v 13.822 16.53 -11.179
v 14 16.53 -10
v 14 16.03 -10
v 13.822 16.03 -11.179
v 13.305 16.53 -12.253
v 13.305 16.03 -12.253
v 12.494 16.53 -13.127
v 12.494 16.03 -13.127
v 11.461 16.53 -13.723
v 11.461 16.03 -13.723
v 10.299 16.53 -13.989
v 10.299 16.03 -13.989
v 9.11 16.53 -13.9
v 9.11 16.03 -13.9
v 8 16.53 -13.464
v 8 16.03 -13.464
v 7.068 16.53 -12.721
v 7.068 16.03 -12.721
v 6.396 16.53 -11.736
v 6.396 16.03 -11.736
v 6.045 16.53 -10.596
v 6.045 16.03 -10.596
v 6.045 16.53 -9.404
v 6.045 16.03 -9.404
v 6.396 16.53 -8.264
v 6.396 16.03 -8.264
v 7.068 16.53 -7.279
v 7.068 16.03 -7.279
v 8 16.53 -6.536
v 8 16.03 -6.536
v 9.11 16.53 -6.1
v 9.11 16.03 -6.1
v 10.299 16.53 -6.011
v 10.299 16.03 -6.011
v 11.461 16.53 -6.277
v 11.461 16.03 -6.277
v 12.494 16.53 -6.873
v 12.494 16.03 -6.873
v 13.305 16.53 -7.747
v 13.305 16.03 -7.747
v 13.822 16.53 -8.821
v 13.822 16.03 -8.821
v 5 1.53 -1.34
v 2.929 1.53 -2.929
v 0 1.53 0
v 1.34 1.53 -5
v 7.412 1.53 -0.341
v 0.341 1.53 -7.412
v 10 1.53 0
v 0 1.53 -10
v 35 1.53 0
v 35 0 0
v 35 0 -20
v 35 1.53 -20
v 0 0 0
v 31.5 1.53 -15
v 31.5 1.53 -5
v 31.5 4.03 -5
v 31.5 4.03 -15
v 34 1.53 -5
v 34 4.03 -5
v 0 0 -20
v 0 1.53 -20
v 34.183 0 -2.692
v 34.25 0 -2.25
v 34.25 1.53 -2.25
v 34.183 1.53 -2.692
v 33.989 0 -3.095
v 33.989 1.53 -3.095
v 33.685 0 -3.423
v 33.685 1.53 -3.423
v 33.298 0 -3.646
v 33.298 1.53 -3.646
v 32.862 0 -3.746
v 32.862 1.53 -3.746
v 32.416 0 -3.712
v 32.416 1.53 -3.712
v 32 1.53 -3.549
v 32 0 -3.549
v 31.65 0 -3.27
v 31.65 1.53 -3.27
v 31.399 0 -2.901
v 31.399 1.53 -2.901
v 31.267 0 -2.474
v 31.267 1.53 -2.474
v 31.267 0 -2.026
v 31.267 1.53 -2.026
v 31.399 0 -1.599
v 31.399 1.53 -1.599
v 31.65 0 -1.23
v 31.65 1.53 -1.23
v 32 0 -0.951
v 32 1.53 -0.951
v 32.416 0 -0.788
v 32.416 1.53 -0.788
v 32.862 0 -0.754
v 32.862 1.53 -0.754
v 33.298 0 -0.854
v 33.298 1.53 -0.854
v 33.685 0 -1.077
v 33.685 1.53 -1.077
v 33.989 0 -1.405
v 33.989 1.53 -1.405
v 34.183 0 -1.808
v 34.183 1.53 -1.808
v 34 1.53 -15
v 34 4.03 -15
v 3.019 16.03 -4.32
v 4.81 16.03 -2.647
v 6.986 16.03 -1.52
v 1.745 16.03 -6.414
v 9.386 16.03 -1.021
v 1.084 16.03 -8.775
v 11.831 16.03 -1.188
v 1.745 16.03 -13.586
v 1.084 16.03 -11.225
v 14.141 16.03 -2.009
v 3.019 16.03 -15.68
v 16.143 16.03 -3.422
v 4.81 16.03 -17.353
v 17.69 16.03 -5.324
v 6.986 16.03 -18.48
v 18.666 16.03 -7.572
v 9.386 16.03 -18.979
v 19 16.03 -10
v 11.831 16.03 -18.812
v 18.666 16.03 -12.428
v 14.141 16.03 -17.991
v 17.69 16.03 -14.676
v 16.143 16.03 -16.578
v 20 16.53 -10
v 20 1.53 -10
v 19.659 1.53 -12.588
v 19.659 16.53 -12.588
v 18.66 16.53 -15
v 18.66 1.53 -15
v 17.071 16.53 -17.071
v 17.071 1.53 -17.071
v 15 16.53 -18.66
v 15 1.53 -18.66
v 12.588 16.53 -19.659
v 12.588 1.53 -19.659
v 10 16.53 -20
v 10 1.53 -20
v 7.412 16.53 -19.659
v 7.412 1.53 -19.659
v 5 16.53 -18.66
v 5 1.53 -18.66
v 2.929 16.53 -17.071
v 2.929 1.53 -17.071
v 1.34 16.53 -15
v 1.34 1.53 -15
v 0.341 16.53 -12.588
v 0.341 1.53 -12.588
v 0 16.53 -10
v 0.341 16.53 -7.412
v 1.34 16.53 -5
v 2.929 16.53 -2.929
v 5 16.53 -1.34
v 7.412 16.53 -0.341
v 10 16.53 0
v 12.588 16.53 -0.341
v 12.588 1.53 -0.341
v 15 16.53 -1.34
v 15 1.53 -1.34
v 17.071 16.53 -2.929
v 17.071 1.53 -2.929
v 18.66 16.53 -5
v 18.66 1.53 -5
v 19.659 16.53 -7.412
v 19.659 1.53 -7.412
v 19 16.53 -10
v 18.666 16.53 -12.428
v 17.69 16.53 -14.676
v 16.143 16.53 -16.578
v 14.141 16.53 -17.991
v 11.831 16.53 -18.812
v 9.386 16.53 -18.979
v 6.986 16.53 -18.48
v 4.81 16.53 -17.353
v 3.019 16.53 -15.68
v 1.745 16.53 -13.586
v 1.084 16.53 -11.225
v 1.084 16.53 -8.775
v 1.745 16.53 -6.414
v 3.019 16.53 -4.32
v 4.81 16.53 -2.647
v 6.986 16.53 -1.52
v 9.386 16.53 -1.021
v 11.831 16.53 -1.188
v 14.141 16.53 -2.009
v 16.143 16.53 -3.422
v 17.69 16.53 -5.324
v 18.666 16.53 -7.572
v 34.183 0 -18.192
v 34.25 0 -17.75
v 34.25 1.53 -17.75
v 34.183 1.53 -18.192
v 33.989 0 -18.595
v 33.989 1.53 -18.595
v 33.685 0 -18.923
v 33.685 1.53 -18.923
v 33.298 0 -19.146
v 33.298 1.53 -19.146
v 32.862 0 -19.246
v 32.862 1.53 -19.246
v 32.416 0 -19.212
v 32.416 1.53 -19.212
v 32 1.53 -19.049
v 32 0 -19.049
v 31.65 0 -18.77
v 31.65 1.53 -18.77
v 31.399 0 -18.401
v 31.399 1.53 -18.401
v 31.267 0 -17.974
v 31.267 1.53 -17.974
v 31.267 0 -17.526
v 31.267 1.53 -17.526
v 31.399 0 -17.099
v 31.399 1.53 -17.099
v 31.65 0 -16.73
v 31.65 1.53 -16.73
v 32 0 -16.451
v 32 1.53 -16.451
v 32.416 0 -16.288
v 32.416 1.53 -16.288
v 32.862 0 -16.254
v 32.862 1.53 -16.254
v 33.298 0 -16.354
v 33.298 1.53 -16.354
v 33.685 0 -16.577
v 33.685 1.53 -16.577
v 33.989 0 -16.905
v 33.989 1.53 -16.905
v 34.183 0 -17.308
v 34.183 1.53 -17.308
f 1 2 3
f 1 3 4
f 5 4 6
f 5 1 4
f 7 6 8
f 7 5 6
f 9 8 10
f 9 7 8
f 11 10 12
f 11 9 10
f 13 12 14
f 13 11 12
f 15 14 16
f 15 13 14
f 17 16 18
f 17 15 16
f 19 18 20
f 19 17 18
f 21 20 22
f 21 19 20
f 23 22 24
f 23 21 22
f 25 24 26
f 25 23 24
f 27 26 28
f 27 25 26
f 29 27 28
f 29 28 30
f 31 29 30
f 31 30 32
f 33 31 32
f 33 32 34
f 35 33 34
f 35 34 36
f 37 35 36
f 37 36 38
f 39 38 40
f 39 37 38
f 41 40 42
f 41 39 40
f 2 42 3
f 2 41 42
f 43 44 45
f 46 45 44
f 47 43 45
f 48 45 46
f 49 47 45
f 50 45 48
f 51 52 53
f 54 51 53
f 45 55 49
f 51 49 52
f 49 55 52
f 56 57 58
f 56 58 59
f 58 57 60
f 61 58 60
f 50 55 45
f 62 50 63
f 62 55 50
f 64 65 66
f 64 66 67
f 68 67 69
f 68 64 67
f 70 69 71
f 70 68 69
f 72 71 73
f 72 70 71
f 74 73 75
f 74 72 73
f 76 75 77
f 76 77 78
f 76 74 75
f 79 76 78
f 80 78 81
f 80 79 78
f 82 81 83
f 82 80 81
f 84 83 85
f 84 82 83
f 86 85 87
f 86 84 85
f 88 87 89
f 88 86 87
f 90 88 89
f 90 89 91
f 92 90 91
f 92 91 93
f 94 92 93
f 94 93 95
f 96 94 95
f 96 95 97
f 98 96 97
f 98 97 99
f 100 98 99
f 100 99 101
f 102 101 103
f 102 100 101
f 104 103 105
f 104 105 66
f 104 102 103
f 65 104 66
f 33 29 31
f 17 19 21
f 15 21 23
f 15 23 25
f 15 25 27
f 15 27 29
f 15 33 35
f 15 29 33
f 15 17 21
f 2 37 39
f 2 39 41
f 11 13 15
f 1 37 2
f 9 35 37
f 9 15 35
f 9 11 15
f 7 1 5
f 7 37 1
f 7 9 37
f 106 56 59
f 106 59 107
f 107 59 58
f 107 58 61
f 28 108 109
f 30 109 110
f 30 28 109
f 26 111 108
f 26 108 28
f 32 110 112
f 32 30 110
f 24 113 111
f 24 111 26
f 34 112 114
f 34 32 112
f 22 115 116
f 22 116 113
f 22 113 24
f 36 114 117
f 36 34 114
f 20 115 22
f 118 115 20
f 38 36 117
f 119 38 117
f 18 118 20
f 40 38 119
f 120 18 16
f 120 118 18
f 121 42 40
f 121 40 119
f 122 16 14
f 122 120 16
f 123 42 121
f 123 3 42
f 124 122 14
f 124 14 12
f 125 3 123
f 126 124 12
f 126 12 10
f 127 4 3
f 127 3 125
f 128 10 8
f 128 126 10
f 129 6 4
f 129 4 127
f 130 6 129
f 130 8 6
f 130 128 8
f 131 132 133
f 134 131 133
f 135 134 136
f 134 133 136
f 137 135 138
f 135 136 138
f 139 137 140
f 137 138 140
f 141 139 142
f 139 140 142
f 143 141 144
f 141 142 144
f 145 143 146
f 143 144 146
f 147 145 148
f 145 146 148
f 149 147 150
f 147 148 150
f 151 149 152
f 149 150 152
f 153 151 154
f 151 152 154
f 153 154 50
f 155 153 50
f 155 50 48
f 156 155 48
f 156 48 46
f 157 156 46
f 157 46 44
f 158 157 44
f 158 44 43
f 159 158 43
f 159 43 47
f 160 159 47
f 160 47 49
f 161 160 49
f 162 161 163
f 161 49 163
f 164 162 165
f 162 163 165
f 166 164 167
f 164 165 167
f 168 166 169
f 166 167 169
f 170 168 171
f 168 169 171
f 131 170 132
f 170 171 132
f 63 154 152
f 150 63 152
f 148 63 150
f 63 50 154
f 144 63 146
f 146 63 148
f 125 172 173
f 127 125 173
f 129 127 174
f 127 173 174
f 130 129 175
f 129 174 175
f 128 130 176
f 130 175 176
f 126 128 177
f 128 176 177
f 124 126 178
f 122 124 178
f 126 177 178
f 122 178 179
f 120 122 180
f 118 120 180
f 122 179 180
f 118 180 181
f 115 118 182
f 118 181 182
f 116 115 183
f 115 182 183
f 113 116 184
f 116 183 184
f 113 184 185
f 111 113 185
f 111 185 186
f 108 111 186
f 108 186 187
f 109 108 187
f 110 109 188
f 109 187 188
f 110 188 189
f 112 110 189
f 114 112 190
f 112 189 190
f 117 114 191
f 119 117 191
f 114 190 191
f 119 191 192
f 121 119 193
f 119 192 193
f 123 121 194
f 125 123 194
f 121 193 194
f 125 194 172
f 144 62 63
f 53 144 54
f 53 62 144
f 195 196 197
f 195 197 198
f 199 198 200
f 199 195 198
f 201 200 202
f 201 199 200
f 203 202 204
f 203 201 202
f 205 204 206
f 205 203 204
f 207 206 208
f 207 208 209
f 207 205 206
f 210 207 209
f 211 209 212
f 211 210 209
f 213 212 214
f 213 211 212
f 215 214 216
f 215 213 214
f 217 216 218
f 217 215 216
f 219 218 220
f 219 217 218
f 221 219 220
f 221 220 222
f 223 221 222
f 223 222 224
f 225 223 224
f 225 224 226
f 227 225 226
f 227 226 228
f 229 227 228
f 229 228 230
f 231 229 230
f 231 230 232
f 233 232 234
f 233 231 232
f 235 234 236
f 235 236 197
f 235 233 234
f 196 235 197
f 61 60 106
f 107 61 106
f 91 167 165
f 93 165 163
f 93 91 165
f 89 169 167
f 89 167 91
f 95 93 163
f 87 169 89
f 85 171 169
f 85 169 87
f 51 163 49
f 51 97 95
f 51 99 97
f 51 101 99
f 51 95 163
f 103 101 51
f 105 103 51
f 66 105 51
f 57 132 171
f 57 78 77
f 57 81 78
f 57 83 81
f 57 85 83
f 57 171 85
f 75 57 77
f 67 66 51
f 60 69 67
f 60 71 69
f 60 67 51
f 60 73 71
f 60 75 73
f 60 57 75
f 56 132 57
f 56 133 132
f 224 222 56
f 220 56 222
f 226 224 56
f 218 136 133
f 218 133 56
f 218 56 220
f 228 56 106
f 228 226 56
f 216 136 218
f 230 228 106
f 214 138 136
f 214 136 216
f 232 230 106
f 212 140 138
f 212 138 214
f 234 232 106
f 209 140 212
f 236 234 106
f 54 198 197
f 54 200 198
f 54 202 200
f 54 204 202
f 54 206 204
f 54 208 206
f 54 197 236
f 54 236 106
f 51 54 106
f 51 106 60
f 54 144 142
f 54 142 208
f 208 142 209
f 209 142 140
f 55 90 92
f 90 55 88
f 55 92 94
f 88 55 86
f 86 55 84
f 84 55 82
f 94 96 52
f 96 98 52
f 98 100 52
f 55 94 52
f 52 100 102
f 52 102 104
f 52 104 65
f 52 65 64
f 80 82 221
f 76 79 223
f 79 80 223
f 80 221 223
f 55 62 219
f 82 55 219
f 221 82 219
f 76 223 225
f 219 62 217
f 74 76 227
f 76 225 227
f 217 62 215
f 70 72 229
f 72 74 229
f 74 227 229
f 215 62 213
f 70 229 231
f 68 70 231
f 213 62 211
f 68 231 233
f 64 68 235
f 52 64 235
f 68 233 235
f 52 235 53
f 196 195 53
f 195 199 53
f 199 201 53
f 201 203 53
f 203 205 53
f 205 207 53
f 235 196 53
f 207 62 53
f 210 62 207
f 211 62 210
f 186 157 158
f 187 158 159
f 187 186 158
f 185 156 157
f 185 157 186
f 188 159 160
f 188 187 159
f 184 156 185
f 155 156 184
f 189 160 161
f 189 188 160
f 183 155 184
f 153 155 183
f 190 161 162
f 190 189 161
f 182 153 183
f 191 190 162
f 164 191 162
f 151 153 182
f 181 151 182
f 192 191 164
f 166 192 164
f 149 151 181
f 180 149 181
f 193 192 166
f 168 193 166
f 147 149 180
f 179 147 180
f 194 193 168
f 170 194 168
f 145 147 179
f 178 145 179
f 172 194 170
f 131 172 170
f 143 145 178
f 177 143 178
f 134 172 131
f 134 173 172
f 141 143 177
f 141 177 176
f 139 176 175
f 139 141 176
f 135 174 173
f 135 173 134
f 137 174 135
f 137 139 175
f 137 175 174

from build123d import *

# Parameters (mm, degrees)
SKETCH1_W           = 35
SKETCH1_H           = 20
SKETCH1_R           = 1.5
BOSS_EXTRUDE1_DEPTH = 1.53
SKETCH2_R           = 10
BOSS_EXTRUDE2_DEPTH = 15
SKETCH3_R           = 9
SKETCH3_R_2         = 4
CUT_EXTRUDE1_DEPTH  = 0.5
SKETCH4_W           = 2.5
SKETCH4_H           = 10
BOSS_EXTRUDE3_DEPTH = 2.5


with BuildPart() as part:
    # Sketch1 → Boss-Extrude1 (new body)
    with BuildSketch(Plane(origin=(0, 0, 0), x_dir=(1, 0, 0), z_dir=(0, 1, 0))):
        with Locations((17.5, 10)):
            Rectangle(SKETCH1_W, SKETCH1_H)
        with Locations((32.75, 17.75)):
            Circle(SKETCH1_R, mode=Mode.SUBTRACT)
        with Locations((32.75, 2.25)):
            Circle(SKETCH1_R, mode=Mode.SUBTRACT)
    extrude(amount=BOSS_EXTRUDE1_DEPTH)

    # Sketch2 → Boss-Extrude2 (add)
    with BuildSketch(Plane(origin=(0, 1.53, 0), x_dir=(1, 0, 0), z_dir=(0, 1, 0))):
        with Locations((10, 10)):
            Circle(SKETCH2_R)
    extrude(amount=BOSS_EXTRUDE2_DEPTH)

    # Sketch3 → Cut-Extrude1 (cut)
    with BuildSketch(Plane(origin=(0, 16.53, 0), x_dir=(1, 0, 0), z_dir=(0, 1, 0))):
        with Locations((10, 10)):
            Circle(SKETCH3_R)
        with Locations((10, 10)):
            Circle(SKETCH3_R_2, mode=Mode.SUBTRACT)
    extrude(amount=-CUT_EXTRUDE1_DEPTH, mode=Mode.SUBTRACT)

    # Sketch4 → Boss-Extrude3 (add)
    with BuildSketch(Plane(origin=(0, 1.53, 0), x_dir=(1, 0, 0), z_dir=(0, 1, 0))):
        with Locations((32.75, 10)):
            Rectangle(SKETCH4_W, SKETCH4_H)
    extrude(amount=BOSS_EXTRUDE3_DEPTH)


solid = part.part
